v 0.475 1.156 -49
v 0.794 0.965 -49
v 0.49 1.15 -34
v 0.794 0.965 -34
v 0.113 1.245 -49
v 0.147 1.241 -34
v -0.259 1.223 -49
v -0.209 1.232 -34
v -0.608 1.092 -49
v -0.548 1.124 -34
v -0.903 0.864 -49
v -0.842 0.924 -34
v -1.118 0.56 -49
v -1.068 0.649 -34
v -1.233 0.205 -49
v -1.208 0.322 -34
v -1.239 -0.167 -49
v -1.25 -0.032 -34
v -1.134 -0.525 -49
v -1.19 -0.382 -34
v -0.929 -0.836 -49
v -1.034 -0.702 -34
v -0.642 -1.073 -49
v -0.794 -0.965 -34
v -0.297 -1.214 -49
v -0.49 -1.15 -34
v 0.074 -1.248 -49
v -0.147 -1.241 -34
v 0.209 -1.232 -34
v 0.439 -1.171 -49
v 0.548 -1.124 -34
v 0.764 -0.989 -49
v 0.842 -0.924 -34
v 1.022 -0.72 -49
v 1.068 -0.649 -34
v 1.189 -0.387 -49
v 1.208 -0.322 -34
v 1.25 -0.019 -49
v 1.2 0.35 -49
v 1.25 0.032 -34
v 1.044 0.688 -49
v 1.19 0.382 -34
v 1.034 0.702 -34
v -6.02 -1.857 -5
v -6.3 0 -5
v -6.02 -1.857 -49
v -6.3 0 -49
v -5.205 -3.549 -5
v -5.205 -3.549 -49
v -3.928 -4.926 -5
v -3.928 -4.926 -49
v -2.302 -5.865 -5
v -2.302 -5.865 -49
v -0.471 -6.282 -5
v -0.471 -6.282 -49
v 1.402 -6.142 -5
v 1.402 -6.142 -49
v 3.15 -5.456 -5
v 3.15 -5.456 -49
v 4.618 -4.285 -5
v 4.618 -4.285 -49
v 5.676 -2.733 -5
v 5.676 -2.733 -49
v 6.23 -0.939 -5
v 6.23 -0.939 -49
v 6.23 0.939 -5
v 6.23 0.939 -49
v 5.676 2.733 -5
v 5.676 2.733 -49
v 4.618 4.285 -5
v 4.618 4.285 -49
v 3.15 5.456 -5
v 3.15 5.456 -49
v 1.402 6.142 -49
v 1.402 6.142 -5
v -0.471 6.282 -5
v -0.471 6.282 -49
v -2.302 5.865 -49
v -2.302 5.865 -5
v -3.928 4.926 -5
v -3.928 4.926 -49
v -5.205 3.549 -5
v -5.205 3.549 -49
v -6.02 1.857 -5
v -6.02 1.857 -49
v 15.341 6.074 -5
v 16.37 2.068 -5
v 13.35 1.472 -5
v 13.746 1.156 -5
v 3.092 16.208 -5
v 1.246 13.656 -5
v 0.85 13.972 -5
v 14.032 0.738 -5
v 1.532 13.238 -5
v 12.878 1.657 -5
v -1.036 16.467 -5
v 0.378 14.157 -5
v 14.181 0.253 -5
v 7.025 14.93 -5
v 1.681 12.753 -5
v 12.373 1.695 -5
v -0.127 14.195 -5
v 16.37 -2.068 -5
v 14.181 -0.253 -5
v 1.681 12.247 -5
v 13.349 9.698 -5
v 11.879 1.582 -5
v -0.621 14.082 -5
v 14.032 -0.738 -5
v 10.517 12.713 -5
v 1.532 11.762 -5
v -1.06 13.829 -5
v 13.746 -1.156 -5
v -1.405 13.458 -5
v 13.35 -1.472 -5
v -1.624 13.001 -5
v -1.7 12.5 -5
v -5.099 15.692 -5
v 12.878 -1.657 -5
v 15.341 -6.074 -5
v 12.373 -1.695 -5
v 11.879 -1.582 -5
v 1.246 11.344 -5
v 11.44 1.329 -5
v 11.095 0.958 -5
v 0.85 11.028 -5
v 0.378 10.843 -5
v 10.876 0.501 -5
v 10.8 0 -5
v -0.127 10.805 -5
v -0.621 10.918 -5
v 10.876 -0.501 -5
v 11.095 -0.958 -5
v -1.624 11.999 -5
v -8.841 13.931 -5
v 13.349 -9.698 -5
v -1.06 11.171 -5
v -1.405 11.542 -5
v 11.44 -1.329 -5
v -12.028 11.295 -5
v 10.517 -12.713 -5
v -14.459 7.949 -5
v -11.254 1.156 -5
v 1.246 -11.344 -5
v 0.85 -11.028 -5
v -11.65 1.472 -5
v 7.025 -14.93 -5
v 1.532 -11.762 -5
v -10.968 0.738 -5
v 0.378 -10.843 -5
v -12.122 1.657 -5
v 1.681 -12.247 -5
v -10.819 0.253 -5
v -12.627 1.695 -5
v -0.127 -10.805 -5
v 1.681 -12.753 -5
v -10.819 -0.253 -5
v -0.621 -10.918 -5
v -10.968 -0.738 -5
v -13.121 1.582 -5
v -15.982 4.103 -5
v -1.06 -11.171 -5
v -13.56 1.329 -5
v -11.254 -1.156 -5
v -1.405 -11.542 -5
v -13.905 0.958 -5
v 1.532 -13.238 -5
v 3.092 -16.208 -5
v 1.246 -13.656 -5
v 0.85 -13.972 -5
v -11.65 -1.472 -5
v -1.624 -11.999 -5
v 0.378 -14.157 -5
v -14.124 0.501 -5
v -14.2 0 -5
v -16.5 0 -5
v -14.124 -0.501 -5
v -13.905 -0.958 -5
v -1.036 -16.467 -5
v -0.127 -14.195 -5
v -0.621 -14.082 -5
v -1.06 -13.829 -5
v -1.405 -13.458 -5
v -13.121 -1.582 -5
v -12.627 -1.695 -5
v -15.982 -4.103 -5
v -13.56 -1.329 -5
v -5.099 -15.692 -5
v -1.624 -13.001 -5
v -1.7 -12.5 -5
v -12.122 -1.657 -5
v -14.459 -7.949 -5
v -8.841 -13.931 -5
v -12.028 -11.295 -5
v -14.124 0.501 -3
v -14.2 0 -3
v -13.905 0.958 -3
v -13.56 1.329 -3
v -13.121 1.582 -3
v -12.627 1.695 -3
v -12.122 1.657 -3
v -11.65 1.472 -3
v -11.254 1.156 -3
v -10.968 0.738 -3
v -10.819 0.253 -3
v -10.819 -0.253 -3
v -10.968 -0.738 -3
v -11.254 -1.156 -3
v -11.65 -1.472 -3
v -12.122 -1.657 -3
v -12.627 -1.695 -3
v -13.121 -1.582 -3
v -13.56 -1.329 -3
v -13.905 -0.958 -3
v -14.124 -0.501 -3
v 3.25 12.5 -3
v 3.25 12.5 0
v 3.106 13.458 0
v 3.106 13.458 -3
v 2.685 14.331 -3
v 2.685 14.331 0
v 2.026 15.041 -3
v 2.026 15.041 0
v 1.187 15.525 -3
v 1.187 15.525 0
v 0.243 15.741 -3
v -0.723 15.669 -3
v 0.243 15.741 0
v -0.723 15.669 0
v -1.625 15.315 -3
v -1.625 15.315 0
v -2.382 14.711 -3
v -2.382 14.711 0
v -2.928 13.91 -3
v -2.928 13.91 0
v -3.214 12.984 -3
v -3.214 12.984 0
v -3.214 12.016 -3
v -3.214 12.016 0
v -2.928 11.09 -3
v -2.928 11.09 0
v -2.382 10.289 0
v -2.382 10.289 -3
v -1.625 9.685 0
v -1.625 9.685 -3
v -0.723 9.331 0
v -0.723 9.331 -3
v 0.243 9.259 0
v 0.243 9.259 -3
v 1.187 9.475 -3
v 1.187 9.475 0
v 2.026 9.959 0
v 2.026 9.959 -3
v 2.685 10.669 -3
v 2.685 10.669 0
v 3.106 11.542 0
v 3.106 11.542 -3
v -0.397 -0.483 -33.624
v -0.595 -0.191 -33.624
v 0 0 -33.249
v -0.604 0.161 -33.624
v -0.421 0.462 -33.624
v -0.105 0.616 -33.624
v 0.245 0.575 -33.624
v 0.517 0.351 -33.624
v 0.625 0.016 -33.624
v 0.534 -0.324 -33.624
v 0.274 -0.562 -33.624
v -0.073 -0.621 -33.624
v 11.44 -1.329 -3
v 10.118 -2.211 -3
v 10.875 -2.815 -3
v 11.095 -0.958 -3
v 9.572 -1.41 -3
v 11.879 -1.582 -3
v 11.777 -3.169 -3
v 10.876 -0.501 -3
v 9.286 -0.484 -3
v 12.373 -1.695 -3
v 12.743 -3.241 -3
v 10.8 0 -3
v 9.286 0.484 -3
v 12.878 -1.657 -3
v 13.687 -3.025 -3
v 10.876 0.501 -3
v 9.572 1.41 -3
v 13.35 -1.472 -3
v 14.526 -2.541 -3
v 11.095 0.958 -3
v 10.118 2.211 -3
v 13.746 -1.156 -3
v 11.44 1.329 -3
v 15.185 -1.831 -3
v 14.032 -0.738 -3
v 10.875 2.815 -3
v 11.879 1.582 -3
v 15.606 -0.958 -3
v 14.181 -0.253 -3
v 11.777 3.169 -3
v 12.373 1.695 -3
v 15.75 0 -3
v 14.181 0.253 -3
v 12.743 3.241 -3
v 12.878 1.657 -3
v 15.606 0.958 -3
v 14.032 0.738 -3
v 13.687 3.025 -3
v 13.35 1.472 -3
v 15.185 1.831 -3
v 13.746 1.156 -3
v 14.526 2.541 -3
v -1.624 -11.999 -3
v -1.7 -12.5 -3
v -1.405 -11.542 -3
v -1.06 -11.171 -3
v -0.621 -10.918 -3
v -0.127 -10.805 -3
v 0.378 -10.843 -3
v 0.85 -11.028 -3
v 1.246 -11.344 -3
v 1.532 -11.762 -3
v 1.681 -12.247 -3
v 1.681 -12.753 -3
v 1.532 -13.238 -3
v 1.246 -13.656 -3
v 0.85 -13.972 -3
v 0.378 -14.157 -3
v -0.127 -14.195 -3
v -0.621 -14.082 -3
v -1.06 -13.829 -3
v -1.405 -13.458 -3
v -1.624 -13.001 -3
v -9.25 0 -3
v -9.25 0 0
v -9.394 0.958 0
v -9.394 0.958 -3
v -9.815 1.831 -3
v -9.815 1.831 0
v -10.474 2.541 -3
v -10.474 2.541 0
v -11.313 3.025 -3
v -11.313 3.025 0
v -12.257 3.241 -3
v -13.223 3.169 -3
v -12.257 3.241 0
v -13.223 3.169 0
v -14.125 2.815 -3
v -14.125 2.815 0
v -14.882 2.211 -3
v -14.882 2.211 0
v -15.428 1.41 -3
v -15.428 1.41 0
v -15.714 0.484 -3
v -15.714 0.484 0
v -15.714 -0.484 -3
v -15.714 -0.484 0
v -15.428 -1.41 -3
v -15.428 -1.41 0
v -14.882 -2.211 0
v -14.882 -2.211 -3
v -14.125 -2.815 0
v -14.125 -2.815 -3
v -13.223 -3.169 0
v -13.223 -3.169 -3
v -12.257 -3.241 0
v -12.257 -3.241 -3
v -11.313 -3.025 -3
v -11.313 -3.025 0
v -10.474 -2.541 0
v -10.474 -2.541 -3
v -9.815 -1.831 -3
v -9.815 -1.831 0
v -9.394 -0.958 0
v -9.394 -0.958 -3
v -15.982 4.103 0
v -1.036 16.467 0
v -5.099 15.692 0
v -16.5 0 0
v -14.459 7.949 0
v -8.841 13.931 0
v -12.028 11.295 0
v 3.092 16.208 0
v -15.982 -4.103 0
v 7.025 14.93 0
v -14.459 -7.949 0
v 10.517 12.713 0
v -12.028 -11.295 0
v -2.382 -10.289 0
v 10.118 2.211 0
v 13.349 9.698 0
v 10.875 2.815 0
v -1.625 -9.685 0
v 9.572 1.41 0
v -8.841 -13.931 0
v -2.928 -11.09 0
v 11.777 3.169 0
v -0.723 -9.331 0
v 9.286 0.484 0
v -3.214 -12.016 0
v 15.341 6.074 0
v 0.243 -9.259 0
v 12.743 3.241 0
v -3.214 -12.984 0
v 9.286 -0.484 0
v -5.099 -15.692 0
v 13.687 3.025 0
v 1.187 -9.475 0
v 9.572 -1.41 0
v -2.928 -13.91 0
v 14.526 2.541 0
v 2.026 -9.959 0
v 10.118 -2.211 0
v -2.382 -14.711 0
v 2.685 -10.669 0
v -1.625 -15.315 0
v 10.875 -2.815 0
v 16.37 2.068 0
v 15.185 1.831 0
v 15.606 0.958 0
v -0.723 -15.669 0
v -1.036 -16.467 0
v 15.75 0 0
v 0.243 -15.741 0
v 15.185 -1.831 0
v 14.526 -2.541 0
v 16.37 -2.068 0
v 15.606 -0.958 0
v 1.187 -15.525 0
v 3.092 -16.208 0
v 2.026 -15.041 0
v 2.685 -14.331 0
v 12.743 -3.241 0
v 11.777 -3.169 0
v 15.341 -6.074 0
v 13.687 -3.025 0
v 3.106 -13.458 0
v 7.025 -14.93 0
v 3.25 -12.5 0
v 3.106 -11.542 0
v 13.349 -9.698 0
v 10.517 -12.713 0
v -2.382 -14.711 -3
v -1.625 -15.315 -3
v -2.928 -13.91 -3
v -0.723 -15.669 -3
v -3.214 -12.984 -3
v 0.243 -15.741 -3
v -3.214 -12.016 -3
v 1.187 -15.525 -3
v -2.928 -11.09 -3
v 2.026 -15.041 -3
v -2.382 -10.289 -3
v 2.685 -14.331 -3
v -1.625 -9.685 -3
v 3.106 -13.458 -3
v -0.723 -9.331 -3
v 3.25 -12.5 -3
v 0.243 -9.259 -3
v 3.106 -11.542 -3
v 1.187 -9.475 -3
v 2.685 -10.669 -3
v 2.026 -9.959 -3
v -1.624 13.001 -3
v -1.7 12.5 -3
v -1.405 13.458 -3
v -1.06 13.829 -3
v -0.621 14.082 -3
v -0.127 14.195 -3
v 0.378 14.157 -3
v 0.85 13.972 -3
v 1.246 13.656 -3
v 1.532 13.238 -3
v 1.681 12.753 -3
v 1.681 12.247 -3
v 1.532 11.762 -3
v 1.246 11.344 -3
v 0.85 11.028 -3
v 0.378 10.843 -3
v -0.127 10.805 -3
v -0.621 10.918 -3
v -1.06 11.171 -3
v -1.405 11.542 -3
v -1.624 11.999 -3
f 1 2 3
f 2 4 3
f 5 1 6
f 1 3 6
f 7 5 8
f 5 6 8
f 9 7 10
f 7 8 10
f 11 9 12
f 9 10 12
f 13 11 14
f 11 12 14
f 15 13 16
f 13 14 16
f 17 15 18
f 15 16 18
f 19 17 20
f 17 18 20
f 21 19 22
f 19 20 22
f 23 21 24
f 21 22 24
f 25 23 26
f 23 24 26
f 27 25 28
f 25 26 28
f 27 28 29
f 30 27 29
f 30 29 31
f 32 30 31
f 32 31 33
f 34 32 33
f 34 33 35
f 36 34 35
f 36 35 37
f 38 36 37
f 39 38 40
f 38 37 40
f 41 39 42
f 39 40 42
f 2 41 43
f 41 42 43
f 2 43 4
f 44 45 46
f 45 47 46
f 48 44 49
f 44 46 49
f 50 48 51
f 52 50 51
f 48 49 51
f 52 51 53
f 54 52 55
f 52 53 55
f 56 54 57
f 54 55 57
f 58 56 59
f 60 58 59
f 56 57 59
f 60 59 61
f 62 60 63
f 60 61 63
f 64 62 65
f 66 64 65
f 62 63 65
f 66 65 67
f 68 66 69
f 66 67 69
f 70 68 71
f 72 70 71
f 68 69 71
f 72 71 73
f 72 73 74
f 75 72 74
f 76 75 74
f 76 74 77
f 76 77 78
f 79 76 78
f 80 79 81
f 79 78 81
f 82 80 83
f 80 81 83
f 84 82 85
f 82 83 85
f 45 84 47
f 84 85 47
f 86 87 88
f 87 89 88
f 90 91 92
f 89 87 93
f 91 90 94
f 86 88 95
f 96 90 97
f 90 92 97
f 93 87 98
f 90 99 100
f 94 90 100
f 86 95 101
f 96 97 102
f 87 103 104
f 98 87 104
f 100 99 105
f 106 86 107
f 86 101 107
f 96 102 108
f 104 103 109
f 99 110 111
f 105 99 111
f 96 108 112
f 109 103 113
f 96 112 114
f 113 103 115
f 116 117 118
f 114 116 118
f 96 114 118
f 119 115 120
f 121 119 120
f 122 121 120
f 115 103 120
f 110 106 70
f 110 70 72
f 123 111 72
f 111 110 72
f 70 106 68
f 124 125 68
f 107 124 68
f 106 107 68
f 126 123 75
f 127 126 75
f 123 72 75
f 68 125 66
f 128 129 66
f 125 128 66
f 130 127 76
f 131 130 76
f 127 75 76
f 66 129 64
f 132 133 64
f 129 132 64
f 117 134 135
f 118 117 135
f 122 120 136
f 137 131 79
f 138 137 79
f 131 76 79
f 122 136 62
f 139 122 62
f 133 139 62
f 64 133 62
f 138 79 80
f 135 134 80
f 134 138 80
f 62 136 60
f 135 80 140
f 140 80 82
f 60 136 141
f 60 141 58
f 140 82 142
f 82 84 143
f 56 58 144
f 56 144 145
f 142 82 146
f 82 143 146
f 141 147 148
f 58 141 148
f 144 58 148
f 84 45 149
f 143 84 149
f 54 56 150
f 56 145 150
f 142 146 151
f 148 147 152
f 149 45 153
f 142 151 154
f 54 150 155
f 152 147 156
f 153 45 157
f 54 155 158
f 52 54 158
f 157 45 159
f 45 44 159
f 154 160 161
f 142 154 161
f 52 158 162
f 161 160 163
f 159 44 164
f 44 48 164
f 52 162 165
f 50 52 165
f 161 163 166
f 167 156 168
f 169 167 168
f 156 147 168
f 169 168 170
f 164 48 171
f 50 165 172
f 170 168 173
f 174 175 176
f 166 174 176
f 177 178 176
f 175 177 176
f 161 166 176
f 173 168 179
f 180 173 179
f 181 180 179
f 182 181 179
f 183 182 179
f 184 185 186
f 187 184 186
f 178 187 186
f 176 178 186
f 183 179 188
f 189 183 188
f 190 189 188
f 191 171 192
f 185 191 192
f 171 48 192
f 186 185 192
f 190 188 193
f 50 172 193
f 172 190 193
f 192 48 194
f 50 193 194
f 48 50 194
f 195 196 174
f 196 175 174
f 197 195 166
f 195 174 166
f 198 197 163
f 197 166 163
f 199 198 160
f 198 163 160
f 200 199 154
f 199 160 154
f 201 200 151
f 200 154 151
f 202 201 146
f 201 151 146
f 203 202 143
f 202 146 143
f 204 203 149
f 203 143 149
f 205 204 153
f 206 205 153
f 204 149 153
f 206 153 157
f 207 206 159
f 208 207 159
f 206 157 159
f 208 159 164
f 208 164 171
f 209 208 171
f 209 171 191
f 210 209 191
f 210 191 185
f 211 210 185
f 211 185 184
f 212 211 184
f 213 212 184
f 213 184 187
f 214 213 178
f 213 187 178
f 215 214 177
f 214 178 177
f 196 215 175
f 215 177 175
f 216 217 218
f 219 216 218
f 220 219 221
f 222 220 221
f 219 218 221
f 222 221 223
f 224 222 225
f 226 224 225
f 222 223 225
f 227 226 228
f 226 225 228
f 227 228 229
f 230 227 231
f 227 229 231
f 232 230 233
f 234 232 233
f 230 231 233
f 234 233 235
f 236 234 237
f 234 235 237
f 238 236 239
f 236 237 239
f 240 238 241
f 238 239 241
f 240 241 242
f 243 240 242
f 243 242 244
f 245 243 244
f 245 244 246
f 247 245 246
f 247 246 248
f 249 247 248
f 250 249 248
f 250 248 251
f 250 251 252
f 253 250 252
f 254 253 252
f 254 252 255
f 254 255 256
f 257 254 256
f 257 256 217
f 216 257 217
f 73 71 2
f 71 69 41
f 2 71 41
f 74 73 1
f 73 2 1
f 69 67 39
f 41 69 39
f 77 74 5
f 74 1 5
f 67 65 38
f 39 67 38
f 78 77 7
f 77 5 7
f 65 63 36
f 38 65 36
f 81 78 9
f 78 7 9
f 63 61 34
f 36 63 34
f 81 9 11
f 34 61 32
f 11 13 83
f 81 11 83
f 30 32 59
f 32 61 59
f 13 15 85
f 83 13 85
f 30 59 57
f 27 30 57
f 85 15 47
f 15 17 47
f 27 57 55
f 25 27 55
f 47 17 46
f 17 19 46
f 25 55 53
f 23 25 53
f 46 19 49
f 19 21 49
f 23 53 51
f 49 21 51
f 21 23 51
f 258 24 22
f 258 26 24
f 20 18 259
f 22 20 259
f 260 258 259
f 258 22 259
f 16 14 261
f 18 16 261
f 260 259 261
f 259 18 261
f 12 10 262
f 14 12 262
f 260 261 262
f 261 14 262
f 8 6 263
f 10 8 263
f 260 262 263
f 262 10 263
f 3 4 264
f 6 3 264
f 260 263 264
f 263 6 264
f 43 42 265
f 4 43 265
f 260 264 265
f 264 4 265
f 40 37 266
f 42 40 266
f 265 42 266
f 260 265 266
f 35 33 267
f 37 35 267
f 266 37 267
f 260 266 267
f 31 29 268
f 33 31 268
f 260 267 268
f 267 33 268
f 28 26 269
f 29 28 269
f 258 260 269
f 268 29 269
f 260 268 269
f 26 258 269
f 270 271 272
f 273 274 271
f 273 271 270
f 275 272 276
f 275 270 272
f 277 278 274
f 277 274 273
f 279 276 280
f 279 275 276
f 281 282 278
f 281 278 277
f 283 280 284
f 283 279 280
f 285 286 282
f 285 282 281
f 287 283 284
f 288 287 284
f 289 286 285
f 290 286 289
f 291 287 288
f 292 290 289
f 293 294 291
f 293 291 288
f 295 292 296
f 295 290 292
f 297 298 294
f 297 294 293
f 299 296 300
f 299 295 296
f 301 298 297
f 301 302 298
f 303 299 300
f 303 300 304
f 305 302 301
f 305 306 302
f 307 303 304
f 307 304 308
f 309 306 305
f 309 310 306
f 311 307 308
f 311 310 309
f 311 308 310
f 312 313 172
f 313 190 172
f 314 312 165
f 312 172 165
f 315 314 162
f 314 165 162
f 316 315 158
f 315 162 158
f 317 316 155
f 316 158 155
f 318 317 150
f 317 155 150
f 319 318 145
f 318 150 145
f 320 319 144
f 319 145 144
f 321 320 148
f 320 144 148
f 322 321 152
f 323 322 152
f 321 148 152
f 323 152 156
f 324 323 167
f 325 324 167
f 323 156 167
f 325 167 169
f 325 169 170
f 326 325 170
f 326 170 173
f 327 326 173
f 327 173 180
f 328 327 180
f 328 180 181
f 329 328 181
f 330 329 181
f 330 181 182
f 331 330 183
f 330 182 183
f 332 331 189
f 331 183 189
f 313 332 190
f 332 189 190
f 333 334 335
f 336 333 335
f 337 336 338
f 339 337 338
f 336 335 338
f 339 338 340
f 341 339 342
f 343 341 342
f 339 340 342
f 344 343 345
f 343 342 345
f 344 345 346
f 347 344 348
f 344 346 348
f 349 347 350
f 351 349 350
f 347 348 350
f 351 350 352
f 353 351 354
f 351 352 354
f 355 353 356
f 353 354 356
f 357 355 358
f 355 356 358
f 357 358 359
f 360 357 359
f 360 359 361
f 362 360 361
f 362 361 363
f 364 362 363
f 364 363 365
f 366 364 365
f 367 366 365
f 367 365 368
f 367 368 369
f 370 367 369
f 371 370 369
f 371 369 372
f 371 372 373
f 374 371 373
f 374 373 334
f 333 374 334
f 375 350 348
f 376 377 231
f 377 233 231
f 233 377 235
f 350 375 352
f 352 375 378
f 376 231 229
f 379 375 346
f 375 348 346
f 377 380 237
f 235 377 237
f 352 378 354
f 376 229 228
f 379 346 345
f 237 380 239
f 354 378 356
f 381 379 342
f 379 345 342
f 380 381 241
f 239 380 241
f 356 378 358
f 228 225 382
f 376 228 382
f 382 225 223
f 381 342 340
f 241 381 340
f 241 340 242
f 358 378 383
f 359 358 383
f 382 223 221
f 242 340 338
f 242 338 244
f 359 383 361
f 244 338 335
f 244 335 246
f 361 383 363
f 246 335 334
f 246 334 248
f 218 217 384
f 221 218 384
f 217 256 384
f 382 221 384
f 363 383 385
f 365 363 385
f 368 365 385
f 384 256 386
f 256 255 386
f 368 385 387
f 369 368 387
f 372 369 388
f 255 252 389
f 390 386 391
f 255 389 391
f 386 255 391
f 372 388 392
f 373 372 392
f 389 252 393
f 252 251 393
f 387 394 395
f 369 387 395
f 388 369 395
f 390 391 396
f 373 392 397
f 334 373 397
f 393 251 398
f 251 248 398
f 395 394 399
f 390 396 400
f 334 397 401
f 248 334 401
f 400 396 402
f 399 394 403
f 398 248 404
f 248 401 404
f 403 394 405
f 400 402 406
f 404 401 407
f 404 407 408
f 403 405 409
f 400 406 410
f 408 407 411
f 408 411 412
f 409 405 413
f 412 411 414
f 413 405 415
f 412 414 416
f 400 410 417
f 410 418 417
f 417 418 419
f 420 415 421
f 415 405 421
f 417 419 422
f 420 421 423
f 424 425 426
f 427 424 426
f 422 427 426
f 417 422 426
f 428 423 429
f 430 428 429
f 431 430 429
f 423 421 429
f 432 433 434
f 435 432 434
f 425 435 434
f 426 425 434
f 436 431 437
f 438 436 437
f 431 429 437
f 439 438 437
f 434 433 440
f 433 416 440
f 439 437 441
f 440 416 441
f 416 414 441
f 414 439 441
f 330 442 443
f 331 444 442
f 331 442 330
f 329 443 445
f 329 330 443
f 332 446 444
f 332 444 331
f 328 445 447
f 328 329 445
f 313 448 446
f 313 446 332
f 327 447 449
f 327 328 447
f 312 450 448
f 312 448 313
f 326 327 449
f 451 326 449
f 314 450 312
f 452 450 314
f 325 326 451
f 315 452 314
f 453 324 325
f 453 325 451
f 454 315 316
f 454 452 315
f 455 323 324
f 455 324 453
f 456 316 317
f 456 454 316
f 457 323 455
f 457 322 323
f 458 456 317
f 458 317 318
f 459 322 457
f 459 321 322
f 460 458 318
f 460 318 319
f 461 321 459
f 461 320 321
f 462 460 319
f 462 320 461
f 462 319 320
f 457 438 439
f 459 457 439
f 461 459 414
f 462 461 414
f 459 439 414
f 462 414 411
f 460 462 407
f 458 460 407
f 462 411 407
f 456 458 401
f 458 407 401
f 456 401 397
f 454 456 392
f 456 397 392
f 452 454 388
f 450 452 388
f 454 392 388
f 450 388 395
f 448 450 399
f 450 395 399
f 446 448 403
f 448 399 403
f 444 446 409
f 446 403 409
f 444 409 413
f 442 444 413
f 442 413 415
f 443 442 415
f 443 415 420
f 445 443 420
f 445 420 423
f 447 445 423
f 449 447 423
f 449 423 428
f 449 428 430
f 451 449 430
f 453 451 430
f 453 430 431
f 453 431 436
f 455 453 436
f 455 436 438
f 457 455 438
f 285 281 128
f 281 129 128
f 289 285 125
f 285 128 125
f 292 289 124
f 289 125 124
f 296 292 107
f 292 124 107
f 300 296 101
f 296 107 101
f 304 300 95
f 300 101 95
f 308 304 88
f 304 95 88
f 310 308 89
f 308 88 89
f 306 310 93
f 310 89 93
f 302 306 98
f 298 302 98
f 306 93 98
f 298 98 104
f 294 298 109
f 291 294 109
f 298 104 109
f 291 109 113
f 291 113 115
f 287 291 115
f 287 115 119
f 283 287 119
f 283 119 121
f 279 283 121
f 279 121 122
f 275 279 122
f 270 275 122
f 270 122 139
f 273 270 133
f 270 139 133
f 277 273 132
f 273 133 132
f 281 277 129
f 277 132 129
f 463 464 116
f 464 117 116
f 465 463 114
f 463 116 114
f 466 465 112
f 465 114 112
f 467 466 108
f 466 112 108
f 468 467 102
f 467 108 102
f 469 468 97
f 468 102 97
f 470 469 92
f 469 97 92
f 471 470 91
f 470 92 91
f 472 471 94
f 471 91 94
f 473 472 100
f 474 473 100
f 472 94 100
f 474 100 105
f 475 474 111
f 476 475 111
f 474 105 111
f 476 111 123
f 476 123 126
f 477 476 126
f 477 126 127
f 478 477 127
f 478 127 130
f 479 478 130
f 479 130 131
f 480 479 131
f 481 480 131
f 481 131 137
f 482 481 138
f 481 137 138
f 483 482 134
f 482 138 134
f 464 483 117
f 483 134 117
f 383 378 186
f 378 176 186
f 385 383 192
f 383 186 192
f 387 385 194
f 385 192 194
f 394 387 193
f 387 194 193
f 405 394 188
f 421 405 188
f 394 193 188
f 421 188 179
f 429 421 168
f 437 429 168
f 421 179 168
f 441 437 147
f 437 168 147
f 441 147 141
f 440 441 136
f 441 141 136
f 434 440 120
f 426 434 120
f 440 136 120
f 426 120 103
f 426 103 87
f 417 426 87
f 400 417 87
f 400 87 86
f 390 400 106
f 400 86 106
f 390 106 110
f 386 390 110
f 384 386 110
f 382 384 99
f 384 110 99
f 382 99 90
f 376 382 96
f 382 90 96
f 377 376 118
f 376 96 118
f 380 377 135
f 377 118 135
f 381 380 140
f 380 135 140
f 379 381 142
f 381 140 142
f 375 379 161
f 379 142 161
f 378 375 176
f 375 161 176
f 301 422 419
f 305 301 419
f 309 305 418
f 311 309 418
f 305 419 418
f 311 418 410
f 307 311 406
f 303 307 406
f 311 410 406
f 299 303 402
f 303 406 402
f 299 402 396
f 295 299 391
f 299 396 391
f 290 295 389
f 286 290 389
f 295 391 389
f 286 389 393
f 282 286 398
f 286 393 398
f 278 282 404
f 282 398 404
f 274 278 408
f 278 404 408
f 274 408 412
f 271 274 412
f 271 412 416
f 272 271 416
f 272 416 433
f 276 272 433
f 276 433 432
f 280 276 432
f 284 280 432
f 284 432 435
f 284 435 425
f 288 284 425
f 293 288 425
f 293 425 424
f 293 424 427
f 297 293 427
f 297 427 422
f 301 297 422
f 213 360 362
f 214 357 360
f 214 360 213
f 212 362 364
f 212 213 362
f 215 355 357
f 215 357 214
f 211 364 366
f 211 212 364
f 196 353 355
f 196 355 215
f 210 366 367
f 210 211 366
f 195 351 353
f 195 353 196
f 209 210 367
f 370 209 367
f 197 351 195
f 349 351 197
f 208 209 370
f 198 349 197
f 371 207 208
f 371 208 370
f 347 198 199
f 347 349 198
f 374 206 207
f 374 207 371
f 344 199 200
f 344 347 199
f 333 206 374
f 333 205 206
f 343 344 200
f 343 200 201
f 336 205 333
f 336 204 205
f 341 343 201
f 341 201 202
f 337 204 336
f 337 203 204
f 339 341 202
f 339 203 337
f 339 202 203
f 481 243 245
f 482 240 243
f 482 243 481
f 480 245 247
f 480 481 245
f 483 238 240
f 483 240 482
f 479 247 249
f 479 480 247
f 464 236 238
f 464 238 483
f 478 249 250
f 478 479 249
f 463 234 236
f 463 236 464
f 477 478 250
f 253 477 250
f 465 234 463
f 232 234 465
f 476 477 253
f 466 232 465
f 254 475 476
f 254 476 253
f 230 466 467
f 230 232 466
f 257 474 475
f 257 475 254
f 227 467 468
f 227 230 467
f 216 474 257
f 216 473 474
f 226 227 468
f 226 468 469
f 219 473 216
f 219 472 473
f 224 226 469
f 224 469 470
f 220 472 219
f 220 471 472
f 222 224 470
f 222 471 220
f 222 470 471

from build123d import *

# Parameters (mm, degrees)
HOLE_WIZARD_M31_D           = 3.4
HOLE_WIZARD_M31_CBORE_D     = 6.5
HOLE_WIZARD_M31_CBORE_DEPTH = 3
M3X0_51_D                   = 2.5
M3X0_51_DEPTH               = 15
M3X0_51_TIP                 = 0.751075774


with BuildPart() as part:
    # Эскиз2 → Повернуть1 (revolve)
    with BuildSketch(Plane(origin=(0, 0, 0), x_dir=(0, 0, -1), z_dir=(1, 0, 0)), mode=Mode.PRIVATE) as revolve_1_sk:
        Polygon((0, 0), (0, 16.5), (5, 16.5), (5, 6.3), (49, 6.3), (49, 0), align=None)
    revolve(revolve_1_sk.sketch.rotate(Axis((0, 0, -49), (0, 0, 1)), 90), axis=Axis((0, 0, -49), (0, 0, 1)))

    # Цековка для винта с внутренним шестигранником M31 (through all)
    with Locations(Plane.XY):
        with Locations((-12.5, 0), (0, 12.5), (12.5, 0), (0, -12.5)):
            CounterBoreHole(HOLE_WIZARD_M31_D / 2, HOLE_WIZARD_M31_CBORE_D / 2, HOLE_WIZARD_M31_CBORE_DEPTH)

    # Отверстие обработанное метчиком M3x0.51
    with Locations(Plane(origin=(2.706733298, -7.232806727, -49), x_dir=(-0.6355249951810988, -0.7720802940757291, 0), z_dir=(0, 0, -1))):
        with Locations((-3.864110878, 6.686444901)):
            Hole(M3X0_51_D / 2, depth=M3X0_51_DEPTH)
            with Locations((0, 0, -(M3X0_51_DEPTH + M3X0_51_TIP / 2))):  # 118° drill point
                Cone(0, M3X0_51_D / 2, M3X0_51_TIP, mode=Mode.SUBTRACT)


solid = part.part
